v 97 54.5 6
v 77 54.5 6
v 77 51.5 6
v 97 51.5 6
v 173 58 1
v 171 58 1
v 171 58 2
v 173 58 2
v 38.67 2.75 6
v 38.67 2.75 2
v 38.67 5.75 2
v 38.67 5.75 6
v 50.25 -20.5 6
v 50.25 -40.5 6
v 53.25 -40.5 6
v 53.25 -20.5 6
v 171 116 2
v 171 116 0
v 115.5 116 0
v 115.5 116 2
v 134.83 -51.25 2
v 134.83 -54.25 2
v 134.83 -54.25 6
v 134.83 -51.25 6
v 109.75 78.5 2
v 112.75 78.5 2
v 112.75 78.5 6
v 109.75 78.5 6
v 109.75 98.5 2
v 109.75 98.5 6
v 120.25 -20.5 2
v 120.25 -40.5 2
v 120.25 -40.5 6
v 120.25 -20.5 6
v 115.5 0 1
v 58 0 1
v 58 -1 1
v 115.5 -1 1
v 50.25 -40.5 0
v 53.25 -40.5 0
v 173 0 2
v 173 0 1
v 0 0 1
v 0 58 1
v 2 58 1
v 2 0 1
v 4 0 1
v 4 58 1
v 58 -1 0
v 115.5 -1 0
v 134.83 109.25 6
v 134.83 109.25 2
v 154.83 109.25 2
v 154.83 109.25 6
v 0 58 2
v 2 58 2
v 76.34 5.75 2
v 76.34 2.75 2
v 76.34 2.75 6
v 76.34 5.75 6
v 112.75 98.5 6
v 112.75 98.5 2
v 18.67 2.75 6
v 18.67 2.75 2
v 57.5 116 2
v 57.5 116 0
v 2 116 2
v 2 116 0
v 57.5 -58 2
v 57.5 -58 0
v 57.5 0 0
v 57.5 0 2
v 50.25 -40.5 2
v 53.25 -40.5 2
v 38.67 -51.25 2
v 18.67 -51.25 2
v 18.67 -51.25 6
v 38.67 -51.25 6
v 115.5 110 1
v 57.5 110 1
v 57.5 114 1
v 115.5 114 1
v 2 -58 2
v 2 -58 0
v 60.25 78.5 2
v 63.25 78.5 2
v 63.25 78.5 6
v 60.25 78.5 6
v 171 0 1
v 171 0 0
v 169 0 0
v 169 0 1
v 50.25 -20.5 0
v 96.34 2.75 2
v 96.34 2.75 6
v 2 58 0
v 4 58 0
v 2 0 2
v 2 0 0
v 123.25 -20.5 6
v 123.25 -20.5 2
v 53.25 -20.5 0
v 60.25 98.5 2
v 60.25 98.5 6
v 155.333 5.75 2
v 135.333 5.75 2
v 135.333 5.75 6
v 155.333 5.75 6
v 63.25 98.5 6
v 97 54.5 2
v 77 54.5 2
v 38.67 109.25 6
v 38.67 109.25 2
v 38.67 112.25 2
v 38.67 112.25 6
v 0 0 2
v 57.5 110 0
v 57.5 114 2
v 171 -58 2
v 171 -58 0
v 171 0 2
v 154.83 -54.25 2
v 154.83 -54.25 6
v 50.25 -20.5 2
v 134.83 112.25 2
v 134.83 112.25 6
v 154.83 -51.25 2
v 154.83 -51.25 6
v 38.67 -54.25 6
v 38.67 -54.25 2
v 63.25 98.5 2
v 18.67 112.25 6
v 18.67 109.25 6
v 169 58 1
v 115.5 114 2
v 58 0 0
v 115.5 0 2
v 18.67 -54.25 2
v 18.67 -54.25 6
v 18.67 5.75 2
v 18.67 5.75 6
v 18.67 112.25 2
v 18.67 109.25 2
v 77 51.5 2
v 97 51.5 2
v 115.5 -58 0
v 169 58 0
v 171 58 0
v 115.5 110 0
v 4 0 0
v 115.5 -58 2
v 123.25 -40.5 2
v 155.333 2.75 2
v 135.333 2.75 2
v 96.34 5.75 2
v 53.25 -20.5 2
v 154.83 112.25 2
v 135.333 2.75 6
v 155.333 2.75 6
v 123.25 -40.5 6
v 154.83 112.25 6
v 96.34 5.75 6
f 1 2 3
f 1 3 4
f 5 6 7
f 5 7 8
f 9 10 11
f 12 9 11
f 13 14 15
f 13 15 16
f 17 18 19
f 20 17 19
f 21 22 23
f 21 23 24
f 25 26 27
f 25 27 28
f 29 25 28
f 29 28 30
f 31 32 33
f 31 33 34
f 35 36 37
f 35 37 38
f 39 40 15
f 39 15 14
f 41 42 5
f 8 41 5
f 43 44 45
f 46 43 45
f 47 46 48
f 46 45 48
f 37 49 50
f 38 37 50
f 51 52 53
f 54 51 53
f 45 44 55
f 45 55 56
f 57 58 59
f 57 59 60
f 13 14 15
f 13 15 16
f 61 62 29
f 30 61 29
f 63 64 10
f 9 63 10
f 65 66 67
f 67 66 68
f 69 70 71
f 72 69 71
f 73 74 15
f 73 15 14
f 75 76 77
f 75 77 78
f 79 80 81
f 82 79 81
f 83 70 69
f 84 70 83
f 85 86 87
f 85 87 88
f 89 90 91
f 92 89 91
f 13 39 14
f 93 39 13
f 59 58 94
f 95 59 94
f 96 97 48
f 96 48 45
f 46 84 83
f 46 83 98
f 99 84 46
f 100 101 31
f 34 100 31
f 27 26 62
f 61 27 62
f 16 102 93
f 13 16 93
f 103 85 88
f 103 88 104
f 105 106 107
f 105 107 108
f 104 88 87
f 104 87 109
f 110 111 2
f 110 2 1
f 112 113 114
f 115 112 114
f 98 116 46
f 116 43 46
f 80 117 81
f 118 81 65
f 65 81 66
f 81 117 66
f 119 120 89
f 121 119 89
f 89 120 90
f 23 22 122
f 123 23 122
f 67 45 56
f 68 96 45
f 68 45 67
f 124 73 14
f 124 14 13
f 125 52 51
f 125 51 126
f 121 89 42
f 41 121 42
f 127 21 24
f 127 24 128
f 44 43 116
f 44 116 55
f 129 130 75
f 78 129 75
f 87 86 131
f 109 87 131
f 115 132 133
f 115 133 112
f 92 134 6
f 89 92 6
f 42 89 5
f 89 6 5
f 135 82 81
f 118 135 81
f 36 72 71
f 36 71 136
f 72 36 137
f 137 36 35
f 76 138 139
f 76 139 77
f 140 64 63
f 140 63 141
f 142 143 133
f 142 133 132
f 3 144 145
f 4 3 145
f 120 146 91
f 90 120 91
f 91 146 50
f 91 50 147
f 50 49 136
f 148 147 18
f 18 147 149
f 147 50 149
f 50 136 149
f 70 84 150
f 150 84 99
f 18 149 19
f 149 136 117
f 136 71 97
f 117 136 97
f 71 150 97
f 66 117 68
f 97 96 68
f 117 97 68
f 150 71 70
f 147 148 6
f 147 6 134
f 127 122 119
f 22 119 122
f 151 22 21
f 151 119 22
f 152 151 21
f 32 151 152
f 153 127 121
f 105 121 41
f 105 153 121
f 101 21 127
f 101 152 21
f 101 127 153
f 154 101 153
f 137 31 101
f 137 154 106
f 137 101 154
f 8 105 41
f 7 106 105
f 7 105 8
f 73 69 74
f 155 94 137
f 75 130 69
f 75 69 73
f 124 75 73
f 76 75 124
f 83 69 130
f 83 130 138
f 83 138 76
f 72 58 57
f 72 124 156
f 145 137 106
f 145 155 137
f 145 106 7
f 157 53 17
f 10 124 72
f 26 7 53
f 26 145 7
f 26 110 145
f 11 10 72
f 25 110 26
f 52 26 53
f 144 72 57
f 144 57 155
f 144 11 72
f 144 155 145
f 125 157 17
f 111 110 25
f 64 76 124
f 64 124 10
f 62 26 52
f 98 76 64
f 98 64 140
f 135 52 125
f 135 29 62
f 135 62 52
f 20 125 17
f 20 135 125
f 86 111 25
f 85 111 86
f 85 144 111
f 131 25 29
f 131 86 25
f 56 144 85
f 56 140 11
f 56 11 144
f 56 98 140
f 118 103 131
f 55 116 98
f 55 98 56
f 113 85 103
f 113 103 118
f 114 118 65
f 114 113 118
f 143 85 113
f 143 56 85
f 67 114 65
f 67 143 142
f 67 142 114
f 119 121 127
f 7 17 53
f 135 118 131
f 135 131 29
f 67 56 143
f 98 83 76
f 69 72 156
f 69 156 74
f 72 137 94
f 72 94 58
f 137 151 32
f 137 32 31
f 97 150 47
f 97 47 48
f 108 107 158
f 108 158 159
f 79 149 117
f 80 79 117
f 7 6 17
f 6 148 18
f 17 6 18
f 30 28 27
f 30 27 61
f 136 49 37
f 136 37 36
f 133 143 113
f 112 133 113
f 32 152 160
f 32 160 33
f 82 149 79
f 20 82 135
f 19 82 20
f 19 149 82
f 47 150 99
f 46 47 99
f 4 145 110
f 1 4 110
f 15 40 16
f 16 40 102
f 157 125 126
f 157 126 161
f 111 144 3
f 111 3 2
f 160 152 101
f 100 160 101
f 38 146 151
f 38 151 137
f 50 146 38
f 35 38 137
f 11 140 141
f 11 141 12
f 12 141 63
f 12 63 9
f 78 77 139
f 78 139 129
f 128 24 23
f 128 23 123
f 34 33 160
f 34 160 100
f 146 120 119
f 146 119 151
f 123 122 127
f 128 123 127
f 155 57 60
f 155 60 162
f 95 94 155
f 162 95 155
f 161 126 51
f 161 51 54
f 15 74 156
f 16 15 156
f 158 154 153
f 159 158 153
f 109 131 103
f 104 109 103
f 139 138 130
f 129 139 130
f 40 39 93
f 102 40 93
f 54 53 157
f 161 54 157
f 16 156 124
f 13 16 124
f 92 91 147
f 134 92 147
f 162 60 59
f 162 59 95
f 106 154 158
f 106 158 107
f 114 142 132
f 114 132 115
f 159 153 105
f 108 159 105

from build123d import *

# Parameters (mm, degrees)
BOX034_W     = 20
BOX034_H     = 3
BOX034_DEPTH = 6
BOX001_W     = 110
BOX001_H     = 58
BOX001_DEPTH = 2
BOX002_W     = 20
BOX002_H     = 3
BOX002_DEPTH = 6
BOX003_W     = 20
BOX003_H     = 3
BOX003_DEPTH = 6
BOX004_W     = 20
BOX004_H     = 3
BOX004_DEPTH = 6
BOX006_W     = 20
BOX006_H     = 3
BOX006_DEPTH = 6
BOX007_W     = 20
BOX007_H     = 3
BOX007_DEPTH = 6
BOX008_W     = 20
BOX008_H     = 3
BOX008_DEPTH = 6
BOX009_W     = 4
BOX009_H     = 58
BOX009_DEPTH = 1
BOX010_W     = 4
BOX010_H     = 58
BOX010_DEPTH = 1
BOX012_W     = 58
BOX012_H     = 55.5
BOX012_DEPTH = 2
BOX011_W     = 4
BOX011_H     = 58
BOX011_DEPTH = 1
BOX017_W     = 20
BOX017_H     = 3
BOX017_DEPTH = 6
BOX018_W     = 20
BOX018_H     = 3
BOX018_DEPTH = 6
BOX026_W     = 20
BOX026_H     = 3
BOX026_DEPTH = 6
BOX027_W     = 58
BOX027_H     = 3
BOX027_DEPTH = 1
BOX029_W     = 20
BOX029_H     = 3
BOX029_DEPTH = 6
BOX030_W     = 58
BOX030_H     = 55.5
BOX030_DEPTH = 2
BOX031_W     = 58
BOX031_H     = 55.5
BOX031_DEPTH = 2
BOX032_W     = 58
BOX032_H     = 55.5
BOX032_DEPTH = 2
BOX033_W     = 20
BOX033_H     = 3
BOX033_DEPTH = 6
BOX035_W     = 20
BOX035_H     = 3
BOX035_DEPTH = 6
BOX_W        = 165
BOX_H        = 58
BOX_DEPTH    = 2


with BuildPart() as cube034:
    # Box034 → Box034 (new body)
    with BuildSketch(Plane(origin=(53.25, -40.5, 0), x_dir=(0, 1, 0), z_dir=(0, 0, 1))):
        with Locations((10, 1.5)):
            Rectangle(BOX034_W, BOX034_H)
    extrude(amount=BOX034_DEPTH)


with BuildPart() as cube001:
    # Box001 → Box001 (new body)
    with BuildSketch(Plane(origin=(115.5, 0, 0), x_dir=(0, 1, 0), z_dir=(0, 0, 1))):
        with Locations((55, 29)):
            Rectangle(BOX001_W, BOX001_H)
    extrude(amount=BOX001_DEPTH)


with BuildPart() as cube002:
    # Box002 → Box002 (new body)
    with BuildSketch(Plane(origin=(18.67, -54.25, 0), x_dir=(1, 0, 0), z_dir=(0, 0, 1))):
        with Locations((10, 1.5)):
            Rectangle(BOX002_W, BOX002_H)
    extrude(amount=BOX002_DEPTH)


with BuildPart() as cube003:
    # Box003 → Box003 (new body)
    with BuildSketch(Plane(origin=(76.34, 2.75, 0), x_dir=(1, 0, 0), z_dir=(0, 0, 1))):
        with Locations((10, 1.5)):
            Rectangle(BOX003_W, BOX003_H)
    extrude(amount=BOX003_DEPTH)


with BuildPart() as cube004:
    # Box004 → Box004 (new body)
    with BuildSketch(Plane(origin=(134.83, -54.25, 0), x_dir=(1, 0, 0), z_dir=(0, 0, 1))):
        with Locations((10, 1.5)):
            Rectangle(BOX004_W, BOX004_H)
    extrude(amount=BOX004_DEPTH)


with BuildPart() as cube006:
    # Box006 → Box006 (new body)
    with BuildSketch(Plane(origin=(134.83, 109.25, 0), x_dir=(1, 0, 0), z_dir=(0, 0, 1))):
        with Locations((10, 1.5)):
            Rectangle(BOX006_W, BOX006_H)
    extrude(amount=BOX006_DEPTH)


with BuildPart() as cube007:
    # Box007 → Box007 (new body)
    with BuildSketch(Plane(origin=(63.25, 78.5, 0), x_dir=(0, 1, 0), z_dir=(0, 0, 1))):
        with Locations((10, 1.5)):
            Rectangle(BOX007_W, BOX007_H)
    extrude(amount=BOX007_DEPTH)


with BuildPart() as cube008:
    # Box008 → Box008 (new body)
    with BuildSketch(Plane(origin=(112.75, 78.5, 0), x_dir=(0, 1, 0), z_dir=(0, 0, 1))):
        with Locations((10, 1.5)):
            Rectangle(BOX008_W, BOX008_H)
    extrude(amount=BOX008_DEPTH)


with BuildPart() as cube009:
    # Box009 → Box009 (new body)
    with BuildSketch(Plane.XY.offset(1)):
        with Locations((2, 29)):
            Rectangle(BOX009_W, BOX009_H)
    extrude(amount=BOX009_DEPTH)


with BuildPart() as cube010:
    # Box010 → Box010 (new body)
    with BuildSketch(Plane(origin=(169, 0, 1), x_dir=(1, 0, 0), z_dir=(0, 0, 1))):
        with Locations((2, 29)):
            Rectangle(BOX010_W, BOX010_H)
    extrude(amount=BOX010_DEPTH)


with BuildPart() as cube012:
    # Box012 → Box012 (new body)
    with BuildSketch(Plane(origin=(57.5, 58, 0), x_dir=(0, 1, 0), z_dir=(0, 0, 1))):
        with Locations((29, 27.75)):
            Rectangle(BOX012_W, BOX012_H)
    extrude(amount=BOX012_DEPTH)


with BuildPart() as cube011:
    # Box011 → Box011 (new body)
    with BuildSketch(Plane(origin=(115.5, 110, 1), x_dir=(0, 1, 0), z_dir=(0, 0, 1))):
        with Locations((2, 29)):
            Rectangle(BOX011_W, BOX011_H)
    extrude(amount=BOX011_DEPTH)


with BuildPart() as cube017:
    # Box017 → Box017 (new body)
    with BuildSketch(Plane(origin=(18.67, 2.75, 0), x_dir=(1, 0, 0), z_dir=(0, 0, 1))):
        with Locations((10, 1.5)):
            Rectangle(BOX017_W, BOX017_H)
    extrude(amount=BOX017_DEPTH)


with BuildPart() as cube018:
    # Box018 → Box018 (new body)
    with BuildSketch(Plane(origin=(135.333, 2.75, 0), x_dir=(1, 0, 0), z_dir=(0, 0, 1))):
        with Locations((10, 1.5)):
            Rectangle(BOX018_W, BOX018_H)
    extrude(amount=BOX018_DEPTH)


with BuildPart() as cube026:
    # Box026 → Box026 (new body)
    with BuildSketch(Plane(origin=(77, 51.5, 0), x_dir=(1, 0, 0), z_dir=(0, 0, 1))):
        with Locations((10, 1.5)):
            Rectangle(BOX026_W, BOX026_H)
    extrude(amount=BOX026_DEPTH)


with BuildPart() as cube027:
    # Box027 → Box027 (new body)
    with BuildSketch(Plane(origin=(58, -1, 0), x_dir=(1, 0, 0), z_dir=(0, 0, 1))):
        with Locations((29, 1.5)):
            Rectangle(BOX027_W, BOX027_H)
    extrude(amount=BOX027_DEPTH)


with BuildPart() as cube029:
    # Box029 → Box029 (new body)
    with BuildSketch(Plane(origin=(18.67, 109.25, 0), x_dir=(1, 0, 0), z_dir=(0, 0, 1))):
        with Locations((10, 1.5)):
            Rectangle(BOX029_W, BOX029_H)
    extrude(amount=BOX029_DEPTH)


with BuildPart() as cube030:
    # Box030 → Box030 (new body)
    with BuildSketch(Plane(origin=(171, 58, 0), x_dir=(0, 1, 0), z_dir=(0, 0, 1))):
        with Locations((29, 27.75)):
            Rectangle(BOX030_W, BOX030_H)
    extrude(amount=BOX030_DEPTH)


with BuildPart() as cube031:
    # Box031 → Box031 (new body)
    with BuildSketch(Plane(origin=(57.5, -58, 0), x_dir=(0, 1, 0), z_dir=(0, 0, 1))):
        with Locations((29, 27.75)):
            Rectangle(BOX031_W, BOX031_H)
    extrude(amount=BOX031_DEPTH)


with BuildPart() as cube032:
    # Box032 → Box032 (new body)
    with BuildSketch(Plane(origin=(171, -58, 0), x_dir=(0, 1, 0), z_dir=(0, 0, 1))):
        with Locations((29, 27.75)):
            Rectangle(BOX032_W, BOX032_H)
    extrude(amount=BOX032_DEPTH)


with BuildPart() as cube033:
    # Box033 → Box033 (new body)
    with BuildSketch(Plane(origin=(53.25, -40.5, 0), x_dir=(0, 1, 0), z_dir=(0, 0, 1))):
        with Locations((10, 1.5)):
            Rectangle(BOX033_W, BOX033_H)
    extrude(amount=BOX033_DEPTH)


with BuildPart() as cube035:
    # Box035 → Box035 (new body)
    with BuildSketch(Plane(origin=(123.25, -40.5, 0), x_dir=(0, 1, 0), z_dir=(0, 0, 1))):
        with Locations((10, 1.5)):
            Rectangle(BOX035_W, BOX035_H)
    extrude(amount=BOX035_DEPTH)


with BuildPart() as fusion:
    # Box → Box (new body)
    with BuildSketch(Plane(origin=(4, 0, 0), x_dir=(1, 0, 0), z_dir=(0, 0, 1))):
        with Locations((82.5, 29)):
            Rectangle(BOX_W, BOX_H)
    extrude(amount=BOX_DEPTH)

    # Fusion: union Cube001, Cube002, Cube003, Cube004, Cube006, Cube007, Cube008, Cube009, Cube010, Cube012, Cube011, Cube017, Cube018, Cube026, Cube027, Cube029, Cube030, Cube031, Cube032, Cube033, Cube035
    add(cube001.part)
    add(cube002.part)
    add(cube003.part)
    add(cube004.part)
    add(cube006.part)
    add(cube007.part)
    add(cube008.part)
    add(cube009.part)
    add(cube010.part)
    add(cube012.part)
    add(cube011.part)
    add(cube017.part)
    add(cube018.part)
    add(cube026.part)
    add(cube027.part)
    add(cube029.part)
    add(cube030.part)
    add(cube031.part)
    add(cube032.part)
    add(cube033.part)
    add(cube035.part)


solid = Compound([cube034.part, fusion.part])
